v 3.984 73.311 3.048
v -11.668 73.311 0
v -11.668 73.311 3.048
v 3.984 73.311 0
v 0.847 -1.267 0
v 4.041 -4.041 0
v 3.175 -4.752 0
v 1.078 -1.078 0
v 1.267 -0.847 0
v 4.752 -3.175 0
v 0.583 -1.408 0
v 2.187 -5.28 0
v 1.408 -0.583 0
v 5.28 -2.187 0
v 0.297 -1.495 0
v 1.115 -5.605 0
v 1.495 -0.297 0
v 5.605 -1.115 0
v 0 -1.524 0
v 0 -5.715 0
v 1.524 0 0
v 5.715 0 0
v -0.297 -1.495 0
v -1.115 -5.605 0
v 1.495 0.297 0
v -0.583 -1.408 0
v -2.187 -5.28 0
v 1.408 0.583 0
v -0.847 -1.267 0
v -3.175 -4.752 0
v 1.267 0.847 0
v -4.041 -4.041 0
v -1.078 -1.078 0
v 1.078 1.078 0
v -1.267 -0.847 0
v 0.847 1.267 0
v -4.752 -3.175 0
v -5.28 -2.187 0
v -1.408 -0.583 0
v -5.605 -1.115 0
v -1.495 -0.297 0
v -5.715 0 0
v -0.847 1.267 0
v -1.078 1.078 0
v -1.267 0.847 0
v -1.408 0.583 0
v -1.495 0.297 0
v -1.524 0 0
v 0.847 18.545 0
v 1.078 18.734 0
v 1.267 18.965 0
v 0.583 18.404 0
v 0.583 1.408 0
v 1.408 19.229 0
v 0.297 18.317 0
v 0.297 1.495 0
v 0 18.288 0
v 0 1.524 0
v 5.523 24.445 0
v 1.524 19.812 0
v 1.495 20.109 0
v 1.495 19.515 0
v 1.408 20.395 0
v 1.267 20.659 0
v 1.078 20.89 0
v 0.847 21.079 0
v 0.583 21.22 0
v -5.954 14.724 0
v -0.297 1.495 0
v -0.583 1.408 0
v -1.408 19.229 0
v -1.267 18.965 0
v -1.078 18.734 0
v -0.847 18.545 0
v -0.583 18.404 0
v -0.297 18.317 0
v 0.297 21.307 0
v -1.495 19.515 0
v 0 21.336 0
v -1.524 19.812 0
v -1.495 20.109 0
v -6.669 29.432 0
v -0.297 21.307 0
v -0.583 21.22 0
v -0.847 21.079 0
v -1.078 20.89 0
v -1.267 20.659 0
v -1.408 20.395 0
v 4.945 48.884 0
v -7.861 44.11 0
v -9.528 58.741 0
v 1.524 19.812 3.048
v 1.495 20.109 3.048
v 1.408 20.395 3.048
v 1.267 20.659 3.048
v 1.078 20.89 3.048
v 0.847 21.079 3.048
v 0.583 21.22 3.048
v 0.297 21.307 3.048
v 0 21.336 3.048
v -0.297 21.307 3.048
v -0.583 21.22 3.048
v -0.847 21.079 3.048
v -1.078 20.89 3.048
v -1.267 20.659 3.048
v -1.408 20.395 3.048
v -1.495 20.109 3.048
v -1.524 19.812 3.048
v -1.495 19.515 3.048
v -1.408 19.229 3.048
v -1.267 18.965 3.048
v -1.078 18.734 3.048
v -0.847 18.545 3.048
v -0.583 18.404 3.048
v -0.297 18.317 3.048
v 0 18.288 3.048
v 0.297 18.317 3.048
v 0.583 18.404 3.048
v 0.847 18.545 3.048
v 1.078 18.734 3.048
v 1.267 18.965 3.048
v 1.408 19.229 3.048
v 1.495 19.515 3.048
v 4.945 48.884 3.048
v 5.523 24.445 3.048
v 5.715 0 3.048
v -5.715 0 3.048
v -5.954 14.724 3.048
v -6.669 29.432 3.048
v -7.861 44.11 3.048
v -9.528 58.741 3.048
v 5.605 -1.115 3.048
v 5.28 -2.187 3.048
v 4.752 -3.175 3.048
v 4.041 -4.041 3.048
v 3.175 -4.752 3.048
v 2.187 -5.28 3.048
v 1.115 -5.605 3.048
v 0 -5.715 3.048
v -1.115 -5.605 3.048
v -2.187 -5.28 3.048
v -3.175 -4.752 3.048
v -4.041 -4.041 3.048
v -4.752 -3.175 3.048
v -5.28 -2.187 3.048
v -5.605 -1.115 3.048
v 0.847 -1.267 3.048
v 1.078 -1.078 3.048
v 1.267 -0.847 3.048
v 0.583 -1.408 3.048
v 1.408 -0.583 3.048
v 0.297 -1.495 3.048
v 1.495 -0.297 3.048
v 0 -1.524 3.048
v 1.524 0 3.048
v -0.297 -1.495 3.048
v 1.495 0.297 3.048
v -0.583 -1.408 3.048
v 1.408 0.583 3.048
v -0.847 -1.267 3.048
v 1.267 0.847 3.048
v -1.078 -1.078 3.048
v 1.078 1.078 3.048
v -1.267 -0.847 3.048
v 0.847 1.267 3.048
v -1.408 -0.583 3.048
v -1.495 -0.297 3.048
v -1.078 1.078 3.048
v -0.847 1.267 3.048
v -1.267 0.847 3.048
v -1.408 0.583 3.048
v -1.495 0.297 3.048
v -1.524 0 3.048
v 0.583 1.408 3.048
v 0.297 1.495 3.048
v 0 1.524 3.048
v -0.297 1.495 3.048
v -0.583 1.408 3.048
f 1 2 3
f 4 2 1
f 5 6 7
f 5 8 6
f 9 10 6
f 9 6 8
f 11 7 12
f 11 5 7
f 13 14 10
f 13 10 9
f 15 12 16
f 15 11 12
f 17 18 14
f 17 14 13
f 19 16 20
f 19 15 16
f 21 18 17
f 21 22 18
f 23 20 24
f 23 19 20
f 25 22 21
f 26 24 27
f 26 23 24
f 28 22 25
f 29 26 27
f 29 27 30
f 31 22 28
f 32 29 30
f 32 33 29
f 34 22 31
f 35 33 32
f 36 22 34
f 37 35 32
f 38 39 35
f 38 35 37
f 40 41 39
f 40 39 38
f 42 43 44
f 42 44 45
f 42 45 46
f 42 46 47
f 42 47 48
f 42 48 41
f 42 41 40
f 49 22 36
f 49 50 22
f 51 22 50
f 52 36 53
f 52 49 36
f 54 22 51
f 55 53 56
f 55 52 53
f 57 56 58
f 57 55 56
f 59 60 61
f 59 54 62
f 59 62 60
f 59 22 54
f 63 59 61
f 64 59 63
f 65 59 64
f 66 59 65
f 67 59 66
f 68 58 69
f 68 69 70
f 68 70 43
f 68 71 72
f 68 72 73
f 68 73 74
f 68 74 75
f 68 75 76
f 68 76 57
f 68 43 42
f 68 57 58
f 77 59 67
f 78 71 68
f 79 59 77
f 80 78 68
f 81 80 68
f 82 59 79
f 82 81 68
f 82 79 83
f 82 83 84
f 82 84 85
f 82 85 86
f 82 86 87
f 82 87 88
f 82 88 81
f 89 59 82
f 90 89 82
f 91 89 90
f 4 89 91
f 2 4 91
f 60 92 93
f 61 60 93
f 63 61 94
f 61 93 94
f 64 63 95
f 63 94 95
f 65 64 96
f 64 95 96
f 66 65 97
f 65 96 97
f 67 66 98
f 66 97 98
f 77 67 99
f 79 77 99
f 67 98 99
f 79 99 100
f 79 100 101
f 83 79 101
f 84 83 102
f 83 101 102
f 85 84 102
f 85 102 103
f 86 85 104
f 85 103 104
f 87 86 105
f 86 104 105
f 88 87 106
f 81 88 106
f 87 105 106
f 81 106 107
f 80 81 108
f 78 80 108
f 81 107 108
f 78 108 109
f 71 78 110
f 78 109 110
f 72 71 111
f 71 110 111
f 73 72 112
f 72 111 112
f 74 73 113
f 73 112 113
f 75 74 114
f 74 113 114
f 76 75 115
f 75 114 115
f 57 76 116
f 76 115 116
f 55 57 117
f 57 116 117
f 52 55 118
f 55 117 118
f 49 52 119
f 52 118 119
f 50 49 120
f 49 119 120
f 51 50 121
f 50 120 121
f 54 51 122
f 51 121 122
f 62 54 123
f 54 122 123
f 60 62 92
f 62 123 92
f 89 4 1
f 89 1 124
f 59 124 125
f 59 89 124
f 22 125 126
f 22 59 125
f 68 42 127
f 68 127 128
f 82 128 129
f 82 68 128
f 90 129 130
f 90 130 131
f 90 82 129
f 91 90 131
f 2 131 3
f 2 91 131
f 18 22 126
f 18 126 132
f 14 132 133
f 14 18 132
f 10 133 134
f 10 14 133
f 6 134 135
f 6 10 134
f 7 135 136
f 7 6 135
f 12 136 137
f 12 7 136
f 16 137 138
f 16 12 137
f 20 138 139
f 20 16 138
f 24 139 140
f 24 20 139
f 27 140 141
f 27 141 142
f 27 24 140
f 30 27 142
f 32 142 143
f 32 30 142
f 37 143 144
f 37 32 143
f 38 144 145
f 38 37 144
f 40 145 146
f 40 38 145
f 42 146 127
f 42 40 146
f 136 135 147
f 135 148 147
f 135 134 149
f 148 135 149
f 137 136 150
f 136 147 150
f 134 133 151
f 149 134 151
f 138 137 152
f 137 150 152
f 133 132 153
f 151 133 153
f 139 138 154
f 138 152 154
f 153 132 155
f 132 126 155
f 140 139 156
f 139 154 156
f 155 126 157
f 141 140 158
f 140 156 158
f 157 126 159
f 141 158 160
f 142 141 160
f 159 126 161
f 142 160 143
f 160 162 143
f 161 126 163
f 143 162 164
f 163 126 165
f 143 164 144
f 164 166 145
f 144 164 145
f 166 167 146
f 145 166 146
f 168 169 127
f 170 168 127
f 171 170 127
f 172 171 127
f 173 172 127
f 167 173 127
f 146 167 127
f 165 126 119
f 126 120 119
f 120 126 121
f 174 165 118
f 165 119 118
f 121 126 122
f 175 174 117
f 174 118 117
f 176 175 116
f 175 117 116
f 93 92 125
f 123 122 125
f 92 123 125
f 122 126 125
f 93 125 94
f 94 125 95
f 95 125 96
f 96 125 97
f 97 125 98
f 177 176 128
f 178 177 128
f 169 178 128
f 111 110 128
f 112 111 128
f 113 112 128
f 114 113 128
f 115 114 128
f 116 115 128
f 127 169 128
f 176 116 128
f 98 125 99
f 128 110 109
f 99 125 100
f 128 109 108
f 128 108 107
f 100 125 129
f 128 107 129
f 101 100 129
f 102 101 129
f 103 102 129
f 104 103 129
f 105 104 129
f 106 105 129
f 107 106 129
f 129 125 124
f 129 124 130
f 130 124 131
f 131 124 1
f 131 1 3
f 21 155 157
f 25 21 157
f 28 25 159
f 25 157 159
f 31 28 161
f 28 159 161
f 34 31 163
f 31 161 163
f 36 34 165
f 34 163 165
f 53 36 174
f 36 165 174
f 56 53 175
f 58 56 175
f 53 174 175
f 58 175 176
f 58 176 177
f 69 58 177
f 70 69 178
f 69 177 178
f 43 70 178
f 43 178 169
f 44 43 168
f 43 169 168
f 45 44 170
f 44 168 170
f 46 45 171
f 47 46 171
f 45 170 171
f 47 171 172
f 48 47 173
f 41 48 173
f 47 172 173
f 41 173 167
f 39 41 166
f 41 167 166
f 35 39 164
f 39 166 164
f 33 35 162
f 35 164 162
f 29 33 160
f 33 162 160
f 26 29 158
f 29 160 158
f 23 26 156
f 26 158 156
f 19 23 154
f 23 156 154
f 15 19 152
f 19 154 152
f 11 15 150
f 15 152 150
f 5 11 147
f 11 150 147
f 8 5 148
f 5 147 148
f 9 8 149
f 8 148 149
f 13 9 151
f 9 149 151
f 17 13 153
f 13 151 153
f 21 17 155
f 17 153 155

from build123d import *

# Parameters (mm, degrees)
LEG_DEPTH       = 3.048
SKETCH4_R       = 1.524
FEETHOLES_DEPTH = 3.048


with BuildPart() as part:
    # Sketch3 → Leg (new body)
    with BuildSketch(Plane.XY):
        with BuildLine():
            Line((-11.667509286, 73.310783577), (3.98378723, 73.310783577))
            ThreePointArc((3.98378723, 73.310783577), (5.282136486, 36.665610885), (5.715, 0))
            ThreePointArc((5.715, 0), (0, -5.715), (-5.715, 0))
            ThreePointArc((-5.715, 0), (-7.20557197, 36.776022608), (-11.667509286, 73.310783577))
        make_face()
    extrude(amount=LEG_DEPTH)

    # Sketch4 → FeetHoles (cut)
    with BuildSketch(Plane.XY.offset(3.048)):
        Circle(SKETCH4_R)
        with Locations((0, 19.812)):
            Circle(SKETCH4_R)
    extrude(amount=-FEETHOLES_DEPTH, mode=Mode.SUBTRACT)


solid = part.part
